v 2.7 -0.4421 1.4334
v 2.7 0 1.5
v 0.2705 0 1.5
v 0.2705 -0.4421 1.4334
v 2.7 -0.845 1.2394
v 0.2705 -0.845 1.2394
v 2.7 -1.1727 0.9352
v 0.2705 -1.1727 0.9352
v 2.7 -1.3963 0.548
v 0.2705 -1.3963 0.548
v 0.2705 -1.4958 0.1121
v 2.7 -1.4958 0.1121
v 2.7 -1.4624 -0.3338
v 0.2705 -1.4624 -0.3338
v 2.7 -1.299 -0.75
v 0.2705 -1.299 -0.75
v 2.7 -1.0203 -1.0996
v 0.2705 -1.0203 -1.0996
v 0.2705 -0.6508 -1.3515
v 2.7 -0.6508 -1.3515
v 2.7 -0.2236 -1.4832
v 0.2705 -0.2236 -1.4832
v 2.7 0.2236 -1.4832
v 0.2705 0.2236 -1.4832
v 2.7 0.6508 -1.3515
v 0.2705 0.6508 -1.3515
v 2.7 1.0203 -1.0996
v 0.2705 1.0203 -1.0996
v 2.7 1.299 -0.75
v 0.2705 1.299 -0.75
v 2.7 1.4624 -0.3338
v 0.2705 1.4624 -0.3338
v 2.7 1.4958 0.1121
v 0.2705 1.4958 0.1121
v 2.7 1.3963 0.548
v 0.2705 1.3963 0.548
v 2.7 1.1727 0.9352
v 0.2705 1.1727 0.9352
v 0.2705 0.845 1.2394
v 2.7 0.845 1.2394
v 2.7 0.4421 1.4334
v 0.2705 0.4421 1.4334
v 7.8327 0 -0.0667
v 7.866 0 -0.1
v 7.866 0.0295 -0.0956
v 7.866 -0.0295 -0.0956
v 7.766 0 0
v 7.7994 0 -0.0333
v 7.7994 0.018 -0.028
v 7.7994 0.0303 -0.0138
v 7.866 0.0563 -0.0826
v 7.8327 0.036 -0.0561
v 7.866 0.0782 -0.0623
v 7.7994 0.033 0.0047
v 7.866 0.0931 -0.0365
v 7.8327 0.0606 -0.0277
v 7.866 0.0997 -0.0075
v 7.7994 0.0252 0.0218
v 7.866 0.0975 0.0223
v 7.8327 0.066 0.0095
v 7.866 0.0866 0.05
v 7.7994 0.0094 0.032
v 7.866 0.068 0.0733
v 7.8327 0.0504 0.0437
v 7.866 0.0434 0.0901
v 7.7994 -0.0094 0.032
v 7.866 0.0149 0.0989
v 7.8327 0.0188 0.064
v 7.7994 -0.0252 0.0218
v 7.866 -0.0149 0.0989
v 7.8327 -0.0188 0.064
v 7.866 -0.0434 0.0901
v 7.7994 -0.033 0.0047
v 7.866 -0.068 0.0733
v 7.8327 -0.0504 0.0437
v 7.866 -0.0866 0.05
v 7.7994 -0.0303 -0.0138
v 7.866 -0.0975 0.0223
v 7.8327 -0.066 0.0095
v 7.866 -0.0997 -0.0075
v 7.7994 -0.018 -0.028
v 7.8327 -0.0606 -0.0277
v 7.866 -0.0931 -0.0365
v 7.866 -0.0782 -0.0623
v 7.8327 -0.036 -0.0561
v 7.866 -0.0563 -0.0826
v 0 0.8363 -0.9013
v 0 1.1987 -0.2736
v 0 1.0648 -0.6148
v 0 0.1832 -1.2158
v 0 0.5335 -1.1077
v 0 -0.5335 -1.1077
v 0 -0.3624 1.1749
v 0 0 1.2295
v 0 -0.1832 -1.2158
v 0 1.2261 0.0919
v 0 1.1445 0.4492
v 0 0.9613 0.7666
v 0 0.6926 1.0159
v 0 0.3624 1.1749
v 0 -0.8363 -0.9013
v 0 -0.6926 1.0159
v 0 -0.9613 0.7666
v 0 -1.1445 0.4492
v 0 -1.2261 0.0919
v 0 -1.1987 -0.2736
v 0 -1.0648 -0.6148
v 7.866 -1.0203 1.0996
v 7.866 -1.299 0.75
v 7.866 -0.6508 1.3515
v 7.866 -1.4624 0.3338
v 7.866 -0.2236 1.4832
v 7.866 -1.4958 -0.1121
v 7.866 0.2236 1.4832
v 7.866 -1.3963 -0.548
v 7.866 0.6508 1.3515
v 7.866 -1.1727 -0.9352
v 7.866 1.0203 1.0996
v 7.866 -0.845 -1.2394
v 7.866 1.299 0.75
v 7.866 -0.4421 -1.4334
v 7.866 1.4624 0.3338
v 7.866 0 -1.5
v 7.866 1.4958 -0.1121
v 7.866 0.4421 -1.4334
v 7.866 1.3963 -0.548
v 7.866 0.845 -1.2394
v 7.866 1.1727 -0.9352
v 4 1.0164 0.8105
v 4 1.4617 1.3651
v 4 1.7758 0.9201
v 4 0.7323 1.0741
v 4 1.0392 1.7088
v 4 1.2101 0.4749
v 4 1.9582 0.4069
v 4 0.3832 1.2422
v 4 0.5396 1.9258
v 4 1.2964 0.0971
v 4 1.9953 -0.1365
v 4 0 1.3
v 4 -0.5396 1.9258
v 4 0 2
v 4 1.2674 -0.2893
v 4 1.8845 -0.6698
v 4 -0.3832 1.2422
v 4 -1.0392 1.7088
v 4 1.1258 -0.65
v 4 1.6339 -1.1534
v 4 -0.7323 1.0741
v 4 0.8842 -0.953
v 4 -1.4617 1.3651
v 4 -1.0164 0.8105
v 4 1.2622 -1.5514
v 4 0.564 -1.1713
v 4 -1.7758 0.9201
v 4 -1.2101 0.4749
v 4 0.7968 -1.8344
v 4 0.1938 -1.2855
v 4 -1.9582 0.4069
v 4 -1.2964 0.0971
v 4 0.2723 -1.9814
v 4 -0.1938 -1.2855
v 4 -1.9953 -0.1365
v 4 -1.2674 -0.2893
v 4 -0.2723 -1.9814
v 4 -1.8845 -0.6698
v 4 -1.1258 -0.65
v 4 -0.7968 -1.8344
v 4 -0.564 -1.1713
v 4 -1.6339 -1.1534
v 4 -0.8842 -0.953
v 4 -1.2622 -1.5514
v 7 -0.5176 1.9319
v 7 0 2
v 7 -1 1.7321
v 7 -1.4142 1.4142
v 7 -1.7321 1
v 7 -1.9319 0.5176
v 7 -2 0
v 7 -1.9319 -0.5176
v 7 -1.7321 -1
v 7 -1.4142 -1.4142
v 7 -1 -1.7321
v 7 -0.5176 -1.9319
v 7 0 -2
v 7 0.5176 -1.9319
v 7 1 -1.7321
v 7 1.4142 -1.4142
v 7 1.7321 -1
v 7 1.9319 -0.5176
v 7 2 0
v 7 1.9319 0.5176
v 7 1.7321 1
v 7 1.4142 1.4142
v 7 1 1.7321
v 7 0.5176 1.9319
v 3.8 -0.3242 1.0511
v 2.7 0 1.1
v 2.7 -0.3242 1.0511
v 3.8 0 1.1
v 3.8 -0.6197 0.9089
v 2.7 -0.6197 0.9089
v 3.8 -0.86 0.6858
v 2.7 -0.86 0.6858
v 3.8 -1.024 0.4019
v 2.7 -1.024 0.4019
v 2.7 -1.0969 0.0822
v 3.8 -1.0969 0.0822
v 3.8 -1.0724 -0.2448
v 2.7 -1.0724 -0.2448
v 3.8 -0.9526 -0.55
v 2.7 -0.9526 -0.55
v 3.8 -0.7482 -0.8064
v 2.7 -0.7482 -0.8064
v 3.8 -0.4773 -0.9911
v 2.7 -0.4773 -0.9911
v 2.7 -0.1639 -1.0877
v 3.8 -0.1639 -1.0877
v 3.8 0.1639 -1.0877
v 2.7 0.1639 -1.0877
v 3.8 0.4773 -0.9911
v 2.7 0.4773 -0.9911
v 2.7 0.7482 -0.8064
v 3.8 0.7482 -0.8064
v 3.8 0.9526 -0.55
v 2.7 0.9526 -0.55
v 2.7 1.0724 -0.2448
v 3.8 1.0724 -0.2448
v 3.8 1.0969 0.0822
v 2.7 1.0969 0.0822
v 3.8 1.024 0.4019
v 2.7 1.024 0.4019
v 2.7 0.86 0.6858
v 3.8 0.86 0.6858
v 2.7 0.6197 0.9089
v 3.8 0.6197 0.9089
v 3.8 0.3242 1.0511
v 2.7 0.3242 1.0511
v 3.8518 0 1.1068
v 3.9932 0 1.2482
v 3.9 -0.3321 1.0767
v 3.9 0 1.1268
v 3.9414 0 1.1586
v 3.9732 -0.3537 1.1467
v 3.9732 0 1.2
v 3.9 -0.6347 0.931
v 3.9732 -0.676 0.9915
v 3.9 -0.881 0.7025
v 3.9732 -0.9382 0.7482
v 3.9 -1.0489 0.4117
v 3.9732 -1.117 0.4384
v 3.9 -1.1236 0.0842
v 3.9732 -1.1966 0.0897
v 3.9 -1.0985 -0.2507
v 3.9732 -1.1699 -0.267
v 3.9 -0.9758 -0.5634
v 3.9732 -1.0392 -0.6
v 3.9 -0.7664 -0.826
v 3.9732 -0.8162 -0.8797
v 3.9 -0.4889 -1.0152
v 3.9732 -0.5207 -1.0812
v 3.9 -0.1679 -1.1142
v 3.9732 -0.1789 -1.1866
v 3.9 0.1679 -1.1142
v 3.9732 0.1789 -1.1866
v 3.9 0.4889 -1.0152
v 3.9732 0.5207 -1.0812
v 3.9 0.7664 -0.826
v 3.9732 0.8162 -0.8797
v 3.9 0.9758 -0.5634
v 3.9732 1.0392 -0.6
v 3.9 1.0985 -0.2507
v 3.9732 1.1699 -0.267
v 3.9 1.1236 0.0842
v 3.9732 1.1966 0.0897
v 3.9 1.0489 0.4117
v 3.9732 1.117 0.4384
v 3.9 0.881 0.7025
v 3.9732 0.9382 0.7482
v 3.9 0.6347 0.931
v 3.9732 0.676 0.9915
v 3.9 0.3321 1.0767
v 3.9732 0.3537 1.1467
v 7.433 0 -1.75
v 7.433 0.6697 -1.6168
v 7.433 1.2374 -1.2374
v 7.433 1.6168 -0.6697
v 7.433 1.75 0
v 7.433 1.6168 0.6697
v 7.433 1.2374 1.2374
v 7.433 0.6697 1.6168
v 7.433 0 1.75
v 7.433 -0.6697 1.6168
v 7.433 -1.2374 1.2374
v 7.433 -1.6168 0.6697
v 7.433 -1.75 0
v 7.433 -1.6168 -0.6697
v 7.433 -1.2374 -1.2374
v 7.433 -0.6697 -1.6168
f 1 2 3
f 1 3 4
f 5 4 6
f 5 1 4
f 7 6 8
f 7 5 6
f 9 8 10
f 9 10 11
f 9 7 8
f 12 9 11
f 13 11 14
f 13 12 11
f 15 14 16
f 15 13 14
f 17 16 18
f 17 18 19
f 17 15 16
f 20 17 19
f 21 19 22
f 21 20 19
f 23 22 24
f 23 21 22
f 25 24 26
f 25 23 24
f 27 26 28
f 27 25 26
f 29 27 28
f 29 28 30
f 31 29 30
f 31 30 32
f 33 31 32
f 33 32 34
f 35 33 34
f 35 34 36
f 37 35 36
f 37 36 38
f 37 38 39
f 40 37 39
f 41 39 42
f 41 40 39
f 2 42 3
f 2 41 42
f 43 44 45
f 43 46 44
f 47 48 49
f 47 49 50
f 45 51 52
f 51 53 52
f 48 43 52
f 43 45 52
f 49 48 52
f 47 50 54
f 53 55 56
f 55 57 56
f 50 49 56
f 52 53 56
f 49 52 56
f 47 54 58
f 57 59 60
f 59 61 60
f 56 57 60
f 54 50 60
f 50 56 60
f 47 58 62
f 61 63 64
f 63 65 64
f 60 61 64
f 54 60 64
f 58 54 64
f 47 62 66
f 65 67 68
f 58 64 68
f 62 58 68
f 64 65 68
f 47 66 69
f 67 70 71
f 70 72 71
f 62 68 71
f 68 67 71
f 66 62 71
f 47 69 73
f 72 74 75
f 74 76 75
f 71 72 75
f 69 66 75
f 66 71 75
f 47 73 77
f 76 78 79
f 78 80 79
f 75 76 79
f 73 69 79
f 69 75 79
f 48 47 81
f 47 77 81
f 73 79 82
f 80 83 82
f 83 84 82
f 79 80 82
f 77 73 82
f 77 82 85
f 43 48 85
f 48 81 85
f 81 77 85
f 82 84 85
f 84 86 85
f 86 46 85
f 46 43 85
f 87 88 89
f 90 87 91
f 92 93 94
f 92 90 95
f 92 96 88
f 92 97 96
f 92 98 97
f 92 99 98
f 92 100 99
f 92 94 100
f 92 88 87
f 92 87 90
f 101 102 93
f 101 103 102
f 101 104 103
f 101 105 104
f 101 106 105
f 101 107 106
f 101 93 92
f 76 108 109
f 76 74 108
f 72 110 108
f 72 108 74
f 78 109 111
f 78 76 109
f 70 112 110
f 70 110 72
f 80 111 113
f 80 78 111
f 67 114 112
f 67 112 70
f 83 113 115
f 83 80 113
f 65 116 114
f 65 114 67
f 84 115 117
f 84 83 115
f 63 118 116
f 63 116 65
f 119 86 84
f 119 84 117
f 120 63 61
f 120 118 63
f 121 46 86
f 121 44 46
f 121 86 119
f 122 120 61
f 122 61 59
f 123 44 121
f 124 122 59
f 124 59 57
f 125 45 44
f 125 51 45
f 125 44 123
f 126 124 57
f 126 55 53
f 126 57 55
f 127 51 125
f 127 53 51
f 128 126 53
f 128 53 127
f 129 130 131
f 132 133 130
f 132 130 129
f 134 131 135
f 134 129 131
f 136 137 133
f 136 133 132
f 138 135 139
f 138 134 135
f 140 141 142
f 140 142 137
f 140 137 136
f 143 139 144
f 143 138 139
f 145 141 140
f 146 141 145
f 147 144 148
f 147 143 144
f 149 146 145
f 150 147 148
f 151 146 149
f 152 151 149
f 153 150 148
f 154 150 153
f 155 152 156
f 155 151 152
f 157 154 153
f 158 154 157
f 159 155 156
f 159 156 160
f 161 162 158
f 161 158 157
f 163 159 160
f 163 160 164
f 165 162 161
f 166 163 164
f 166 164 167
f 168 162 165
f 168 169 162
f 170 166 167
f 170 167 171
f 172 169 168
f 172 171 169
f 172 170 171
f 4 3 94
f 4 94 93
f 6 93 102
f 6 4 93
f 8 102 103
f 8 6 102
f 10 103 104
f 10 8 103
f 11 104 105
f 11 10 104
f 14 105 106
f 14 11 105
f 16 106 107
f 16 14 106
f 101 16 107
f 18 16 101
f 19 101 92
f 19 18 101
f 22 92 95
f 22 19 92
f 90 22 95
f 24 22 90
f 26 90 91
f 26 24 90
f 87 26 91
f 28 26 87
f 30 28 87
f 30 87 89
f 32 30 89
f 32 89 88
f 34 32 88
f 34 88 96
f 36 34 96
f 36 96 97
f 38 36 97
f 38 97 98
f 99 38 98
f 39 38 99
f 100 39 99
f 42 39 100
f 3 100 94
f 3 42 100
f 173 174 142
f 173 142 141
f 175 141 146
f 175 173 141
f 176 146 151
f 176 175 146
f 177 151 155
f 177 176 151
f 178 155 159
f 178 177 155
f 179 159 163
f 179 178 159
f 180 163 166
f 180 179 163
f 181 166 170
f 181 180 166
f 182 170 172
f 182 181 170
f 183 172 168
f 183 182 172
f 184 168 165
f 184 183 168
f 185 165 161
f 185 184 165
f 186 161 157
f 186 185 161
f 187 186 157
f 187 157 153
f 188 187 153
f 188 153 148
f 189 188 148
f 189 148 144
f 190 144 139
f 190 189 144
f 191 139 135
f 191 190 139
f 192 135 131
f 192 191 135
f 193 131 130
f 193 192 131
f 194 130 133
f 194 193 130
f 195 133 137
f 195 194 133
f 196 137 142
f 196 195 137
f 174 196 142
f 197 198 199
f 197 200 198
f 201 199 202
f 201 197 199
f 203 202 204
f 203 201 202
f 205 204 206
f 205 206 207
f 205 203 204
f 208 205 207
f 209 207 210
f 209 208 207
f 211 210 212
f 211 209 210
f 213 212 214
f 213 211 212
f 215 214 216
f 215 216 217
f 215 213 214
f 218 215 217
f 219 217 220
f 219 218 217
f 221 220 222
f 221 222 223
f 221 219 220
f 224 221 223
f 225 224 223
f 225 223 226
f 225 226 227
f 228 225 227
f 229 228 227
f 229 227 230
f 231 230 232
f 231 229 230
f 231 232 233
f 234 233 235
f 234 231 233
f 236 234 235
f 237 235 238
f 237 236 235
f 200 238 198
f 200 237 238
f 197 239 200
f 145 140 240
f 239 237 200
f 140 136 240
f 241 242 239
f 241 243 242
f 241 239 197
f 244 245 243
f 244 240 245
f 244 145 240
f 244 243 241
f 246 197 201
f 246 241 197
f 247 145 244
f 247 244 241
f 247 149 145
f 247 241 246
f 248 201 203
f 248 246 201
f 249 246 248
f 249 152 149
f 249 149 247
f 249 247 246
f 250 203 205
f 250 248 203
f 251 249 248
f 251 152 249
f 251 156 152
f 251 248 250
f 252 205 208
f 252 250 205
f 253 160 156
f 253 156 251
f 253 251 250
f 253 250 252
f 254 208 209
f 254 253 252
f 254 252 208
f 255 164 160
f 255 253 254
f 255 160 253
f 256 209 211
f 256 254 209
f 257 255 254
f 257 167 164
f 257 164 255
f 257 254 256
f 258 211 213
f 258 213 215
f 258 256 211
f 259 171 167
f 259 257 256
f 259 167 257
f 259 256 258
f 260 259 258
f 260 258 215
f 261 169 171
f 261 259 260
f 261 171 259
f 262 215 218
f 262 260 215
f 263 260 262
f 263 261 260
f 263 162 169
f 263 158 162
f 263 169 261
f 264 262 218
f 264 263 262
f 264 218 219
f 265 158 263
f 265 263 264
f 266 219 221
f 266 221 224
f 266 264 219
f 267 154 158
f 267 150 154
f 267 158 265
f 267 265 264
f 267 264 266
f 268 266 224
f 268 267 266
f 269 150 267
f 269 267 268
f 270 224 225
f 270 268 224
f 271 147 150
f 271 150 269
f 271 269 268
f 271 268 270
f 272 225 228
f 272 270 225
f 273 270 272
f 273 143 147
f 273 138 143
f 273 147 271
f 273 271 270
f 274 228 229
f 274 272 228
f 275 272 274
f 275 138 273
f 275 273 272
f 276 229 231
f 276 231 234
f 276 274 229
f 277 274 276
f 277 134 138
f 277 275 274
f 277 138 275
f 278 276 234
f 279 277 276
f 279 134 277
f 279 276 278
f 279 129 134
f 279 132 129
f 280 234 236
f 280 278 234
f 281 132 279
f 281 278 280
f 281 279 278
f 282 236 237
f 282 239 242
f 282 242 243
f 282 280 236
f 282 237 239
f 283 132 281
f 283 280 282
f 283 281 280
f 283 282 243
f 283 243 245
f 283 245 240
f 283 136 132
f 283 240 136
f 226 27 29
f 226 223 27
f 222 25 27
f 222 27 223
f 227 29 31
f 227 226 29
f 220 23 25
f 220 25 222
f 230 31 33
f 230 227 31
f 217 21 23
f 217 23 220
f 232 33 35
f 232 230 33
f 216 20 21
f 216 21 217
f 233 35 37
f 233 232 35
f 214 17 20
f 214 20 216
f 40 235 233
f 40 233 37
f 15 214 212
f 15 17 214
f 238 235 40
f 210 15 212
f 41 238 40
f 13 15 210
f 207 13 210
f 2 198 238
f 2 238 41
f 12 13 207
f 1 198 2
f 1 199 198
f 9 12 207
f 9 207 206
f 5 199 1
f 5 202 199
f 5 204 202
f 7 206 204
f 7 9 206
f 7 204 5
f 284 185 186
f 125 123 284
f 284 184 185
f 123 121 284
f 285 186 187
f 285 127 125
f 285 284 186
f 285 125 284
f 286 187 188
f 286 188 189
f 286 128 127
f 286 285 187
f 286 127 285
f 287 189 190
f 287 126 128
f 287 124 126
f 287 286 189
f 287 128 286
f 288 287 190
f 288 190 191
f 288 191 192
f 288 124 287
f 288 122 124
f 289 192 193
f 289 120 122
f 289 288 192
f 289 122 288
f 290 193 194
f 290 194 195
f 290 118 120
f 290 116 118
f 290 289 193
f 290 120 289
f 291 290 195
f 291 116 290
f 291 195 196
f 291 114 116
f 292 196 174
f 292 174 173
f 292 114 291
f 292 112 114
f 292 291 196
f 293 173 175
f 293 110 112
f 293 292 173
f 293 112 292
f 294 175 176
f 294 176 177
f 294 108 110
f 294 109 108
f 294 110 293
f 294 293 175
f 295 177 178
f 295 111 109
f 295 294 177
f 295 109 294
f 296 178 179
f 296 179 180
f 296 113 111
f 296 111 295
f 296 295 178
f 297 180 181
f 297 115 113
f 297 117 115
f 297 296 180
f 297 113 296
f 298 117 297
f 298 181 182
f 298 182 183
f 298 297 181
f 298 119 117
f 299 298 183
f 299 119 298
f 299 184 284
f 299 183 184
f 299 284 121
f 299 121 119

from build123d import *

# Parameters (mm, degrees)
CHAMFER5_SIZE = 0.2705


with BuildPart() as part:
    # Sketch1 → Revolve1 (revolve)
    with BuildSketch(Plane.XY):
        with BuildLine():
            Line((0, 0), (0, 1.5))
            Line((0, 1.5), (2.7, 1.5))
            Line((2.7, 1.5), (2.7, 1.1))
            Line((2.7, 1.1), (3.8, 1.1))
            ThreePointArc((3.8, 1.1), (3.941421356, 1.158578644), (4, 1.3))
            Line((4, 1.3), (4, 2))
            Line((4, 2), (7, 2))
            Line((7, 2), (7, 0))
            Line((7, 0), (0, 0))
        make_face()
    revolve(axis=Axis((0, 0, 0), (1, 0, 0)))

    # Chamfer5
    chamfer5_edges = [part.edges().sort_by_distance(p)[0] for p in [
        (0, -1.5, 0),
    ]]
    chamfer(chamfer5_edges, length=CHAMFER5_SIZE)

    # Sketch5 → Revolve3 (revolve)
    with BuildSketch(Plane.XY):
        Polygon((7, 0), (7, 2), (7.866025404, 1.5), (7.866025404, 0), align=None)
    revolve(axis=Axis((0, 0, 0), (1, 0, 0)))

    # Sketch6 → Cut-Revolve3 (revolve, cut)
    with BuildSketch(Plane.XY):
        Polygon((7.866025404, 0.1), (7.866025404, 0), (7.766025404, 0), align=None)
    revolve(axis=Axis((0, 0, 0), (1, 0, 0)), mode=Mode.SUBTRACT)


solid = part.part
